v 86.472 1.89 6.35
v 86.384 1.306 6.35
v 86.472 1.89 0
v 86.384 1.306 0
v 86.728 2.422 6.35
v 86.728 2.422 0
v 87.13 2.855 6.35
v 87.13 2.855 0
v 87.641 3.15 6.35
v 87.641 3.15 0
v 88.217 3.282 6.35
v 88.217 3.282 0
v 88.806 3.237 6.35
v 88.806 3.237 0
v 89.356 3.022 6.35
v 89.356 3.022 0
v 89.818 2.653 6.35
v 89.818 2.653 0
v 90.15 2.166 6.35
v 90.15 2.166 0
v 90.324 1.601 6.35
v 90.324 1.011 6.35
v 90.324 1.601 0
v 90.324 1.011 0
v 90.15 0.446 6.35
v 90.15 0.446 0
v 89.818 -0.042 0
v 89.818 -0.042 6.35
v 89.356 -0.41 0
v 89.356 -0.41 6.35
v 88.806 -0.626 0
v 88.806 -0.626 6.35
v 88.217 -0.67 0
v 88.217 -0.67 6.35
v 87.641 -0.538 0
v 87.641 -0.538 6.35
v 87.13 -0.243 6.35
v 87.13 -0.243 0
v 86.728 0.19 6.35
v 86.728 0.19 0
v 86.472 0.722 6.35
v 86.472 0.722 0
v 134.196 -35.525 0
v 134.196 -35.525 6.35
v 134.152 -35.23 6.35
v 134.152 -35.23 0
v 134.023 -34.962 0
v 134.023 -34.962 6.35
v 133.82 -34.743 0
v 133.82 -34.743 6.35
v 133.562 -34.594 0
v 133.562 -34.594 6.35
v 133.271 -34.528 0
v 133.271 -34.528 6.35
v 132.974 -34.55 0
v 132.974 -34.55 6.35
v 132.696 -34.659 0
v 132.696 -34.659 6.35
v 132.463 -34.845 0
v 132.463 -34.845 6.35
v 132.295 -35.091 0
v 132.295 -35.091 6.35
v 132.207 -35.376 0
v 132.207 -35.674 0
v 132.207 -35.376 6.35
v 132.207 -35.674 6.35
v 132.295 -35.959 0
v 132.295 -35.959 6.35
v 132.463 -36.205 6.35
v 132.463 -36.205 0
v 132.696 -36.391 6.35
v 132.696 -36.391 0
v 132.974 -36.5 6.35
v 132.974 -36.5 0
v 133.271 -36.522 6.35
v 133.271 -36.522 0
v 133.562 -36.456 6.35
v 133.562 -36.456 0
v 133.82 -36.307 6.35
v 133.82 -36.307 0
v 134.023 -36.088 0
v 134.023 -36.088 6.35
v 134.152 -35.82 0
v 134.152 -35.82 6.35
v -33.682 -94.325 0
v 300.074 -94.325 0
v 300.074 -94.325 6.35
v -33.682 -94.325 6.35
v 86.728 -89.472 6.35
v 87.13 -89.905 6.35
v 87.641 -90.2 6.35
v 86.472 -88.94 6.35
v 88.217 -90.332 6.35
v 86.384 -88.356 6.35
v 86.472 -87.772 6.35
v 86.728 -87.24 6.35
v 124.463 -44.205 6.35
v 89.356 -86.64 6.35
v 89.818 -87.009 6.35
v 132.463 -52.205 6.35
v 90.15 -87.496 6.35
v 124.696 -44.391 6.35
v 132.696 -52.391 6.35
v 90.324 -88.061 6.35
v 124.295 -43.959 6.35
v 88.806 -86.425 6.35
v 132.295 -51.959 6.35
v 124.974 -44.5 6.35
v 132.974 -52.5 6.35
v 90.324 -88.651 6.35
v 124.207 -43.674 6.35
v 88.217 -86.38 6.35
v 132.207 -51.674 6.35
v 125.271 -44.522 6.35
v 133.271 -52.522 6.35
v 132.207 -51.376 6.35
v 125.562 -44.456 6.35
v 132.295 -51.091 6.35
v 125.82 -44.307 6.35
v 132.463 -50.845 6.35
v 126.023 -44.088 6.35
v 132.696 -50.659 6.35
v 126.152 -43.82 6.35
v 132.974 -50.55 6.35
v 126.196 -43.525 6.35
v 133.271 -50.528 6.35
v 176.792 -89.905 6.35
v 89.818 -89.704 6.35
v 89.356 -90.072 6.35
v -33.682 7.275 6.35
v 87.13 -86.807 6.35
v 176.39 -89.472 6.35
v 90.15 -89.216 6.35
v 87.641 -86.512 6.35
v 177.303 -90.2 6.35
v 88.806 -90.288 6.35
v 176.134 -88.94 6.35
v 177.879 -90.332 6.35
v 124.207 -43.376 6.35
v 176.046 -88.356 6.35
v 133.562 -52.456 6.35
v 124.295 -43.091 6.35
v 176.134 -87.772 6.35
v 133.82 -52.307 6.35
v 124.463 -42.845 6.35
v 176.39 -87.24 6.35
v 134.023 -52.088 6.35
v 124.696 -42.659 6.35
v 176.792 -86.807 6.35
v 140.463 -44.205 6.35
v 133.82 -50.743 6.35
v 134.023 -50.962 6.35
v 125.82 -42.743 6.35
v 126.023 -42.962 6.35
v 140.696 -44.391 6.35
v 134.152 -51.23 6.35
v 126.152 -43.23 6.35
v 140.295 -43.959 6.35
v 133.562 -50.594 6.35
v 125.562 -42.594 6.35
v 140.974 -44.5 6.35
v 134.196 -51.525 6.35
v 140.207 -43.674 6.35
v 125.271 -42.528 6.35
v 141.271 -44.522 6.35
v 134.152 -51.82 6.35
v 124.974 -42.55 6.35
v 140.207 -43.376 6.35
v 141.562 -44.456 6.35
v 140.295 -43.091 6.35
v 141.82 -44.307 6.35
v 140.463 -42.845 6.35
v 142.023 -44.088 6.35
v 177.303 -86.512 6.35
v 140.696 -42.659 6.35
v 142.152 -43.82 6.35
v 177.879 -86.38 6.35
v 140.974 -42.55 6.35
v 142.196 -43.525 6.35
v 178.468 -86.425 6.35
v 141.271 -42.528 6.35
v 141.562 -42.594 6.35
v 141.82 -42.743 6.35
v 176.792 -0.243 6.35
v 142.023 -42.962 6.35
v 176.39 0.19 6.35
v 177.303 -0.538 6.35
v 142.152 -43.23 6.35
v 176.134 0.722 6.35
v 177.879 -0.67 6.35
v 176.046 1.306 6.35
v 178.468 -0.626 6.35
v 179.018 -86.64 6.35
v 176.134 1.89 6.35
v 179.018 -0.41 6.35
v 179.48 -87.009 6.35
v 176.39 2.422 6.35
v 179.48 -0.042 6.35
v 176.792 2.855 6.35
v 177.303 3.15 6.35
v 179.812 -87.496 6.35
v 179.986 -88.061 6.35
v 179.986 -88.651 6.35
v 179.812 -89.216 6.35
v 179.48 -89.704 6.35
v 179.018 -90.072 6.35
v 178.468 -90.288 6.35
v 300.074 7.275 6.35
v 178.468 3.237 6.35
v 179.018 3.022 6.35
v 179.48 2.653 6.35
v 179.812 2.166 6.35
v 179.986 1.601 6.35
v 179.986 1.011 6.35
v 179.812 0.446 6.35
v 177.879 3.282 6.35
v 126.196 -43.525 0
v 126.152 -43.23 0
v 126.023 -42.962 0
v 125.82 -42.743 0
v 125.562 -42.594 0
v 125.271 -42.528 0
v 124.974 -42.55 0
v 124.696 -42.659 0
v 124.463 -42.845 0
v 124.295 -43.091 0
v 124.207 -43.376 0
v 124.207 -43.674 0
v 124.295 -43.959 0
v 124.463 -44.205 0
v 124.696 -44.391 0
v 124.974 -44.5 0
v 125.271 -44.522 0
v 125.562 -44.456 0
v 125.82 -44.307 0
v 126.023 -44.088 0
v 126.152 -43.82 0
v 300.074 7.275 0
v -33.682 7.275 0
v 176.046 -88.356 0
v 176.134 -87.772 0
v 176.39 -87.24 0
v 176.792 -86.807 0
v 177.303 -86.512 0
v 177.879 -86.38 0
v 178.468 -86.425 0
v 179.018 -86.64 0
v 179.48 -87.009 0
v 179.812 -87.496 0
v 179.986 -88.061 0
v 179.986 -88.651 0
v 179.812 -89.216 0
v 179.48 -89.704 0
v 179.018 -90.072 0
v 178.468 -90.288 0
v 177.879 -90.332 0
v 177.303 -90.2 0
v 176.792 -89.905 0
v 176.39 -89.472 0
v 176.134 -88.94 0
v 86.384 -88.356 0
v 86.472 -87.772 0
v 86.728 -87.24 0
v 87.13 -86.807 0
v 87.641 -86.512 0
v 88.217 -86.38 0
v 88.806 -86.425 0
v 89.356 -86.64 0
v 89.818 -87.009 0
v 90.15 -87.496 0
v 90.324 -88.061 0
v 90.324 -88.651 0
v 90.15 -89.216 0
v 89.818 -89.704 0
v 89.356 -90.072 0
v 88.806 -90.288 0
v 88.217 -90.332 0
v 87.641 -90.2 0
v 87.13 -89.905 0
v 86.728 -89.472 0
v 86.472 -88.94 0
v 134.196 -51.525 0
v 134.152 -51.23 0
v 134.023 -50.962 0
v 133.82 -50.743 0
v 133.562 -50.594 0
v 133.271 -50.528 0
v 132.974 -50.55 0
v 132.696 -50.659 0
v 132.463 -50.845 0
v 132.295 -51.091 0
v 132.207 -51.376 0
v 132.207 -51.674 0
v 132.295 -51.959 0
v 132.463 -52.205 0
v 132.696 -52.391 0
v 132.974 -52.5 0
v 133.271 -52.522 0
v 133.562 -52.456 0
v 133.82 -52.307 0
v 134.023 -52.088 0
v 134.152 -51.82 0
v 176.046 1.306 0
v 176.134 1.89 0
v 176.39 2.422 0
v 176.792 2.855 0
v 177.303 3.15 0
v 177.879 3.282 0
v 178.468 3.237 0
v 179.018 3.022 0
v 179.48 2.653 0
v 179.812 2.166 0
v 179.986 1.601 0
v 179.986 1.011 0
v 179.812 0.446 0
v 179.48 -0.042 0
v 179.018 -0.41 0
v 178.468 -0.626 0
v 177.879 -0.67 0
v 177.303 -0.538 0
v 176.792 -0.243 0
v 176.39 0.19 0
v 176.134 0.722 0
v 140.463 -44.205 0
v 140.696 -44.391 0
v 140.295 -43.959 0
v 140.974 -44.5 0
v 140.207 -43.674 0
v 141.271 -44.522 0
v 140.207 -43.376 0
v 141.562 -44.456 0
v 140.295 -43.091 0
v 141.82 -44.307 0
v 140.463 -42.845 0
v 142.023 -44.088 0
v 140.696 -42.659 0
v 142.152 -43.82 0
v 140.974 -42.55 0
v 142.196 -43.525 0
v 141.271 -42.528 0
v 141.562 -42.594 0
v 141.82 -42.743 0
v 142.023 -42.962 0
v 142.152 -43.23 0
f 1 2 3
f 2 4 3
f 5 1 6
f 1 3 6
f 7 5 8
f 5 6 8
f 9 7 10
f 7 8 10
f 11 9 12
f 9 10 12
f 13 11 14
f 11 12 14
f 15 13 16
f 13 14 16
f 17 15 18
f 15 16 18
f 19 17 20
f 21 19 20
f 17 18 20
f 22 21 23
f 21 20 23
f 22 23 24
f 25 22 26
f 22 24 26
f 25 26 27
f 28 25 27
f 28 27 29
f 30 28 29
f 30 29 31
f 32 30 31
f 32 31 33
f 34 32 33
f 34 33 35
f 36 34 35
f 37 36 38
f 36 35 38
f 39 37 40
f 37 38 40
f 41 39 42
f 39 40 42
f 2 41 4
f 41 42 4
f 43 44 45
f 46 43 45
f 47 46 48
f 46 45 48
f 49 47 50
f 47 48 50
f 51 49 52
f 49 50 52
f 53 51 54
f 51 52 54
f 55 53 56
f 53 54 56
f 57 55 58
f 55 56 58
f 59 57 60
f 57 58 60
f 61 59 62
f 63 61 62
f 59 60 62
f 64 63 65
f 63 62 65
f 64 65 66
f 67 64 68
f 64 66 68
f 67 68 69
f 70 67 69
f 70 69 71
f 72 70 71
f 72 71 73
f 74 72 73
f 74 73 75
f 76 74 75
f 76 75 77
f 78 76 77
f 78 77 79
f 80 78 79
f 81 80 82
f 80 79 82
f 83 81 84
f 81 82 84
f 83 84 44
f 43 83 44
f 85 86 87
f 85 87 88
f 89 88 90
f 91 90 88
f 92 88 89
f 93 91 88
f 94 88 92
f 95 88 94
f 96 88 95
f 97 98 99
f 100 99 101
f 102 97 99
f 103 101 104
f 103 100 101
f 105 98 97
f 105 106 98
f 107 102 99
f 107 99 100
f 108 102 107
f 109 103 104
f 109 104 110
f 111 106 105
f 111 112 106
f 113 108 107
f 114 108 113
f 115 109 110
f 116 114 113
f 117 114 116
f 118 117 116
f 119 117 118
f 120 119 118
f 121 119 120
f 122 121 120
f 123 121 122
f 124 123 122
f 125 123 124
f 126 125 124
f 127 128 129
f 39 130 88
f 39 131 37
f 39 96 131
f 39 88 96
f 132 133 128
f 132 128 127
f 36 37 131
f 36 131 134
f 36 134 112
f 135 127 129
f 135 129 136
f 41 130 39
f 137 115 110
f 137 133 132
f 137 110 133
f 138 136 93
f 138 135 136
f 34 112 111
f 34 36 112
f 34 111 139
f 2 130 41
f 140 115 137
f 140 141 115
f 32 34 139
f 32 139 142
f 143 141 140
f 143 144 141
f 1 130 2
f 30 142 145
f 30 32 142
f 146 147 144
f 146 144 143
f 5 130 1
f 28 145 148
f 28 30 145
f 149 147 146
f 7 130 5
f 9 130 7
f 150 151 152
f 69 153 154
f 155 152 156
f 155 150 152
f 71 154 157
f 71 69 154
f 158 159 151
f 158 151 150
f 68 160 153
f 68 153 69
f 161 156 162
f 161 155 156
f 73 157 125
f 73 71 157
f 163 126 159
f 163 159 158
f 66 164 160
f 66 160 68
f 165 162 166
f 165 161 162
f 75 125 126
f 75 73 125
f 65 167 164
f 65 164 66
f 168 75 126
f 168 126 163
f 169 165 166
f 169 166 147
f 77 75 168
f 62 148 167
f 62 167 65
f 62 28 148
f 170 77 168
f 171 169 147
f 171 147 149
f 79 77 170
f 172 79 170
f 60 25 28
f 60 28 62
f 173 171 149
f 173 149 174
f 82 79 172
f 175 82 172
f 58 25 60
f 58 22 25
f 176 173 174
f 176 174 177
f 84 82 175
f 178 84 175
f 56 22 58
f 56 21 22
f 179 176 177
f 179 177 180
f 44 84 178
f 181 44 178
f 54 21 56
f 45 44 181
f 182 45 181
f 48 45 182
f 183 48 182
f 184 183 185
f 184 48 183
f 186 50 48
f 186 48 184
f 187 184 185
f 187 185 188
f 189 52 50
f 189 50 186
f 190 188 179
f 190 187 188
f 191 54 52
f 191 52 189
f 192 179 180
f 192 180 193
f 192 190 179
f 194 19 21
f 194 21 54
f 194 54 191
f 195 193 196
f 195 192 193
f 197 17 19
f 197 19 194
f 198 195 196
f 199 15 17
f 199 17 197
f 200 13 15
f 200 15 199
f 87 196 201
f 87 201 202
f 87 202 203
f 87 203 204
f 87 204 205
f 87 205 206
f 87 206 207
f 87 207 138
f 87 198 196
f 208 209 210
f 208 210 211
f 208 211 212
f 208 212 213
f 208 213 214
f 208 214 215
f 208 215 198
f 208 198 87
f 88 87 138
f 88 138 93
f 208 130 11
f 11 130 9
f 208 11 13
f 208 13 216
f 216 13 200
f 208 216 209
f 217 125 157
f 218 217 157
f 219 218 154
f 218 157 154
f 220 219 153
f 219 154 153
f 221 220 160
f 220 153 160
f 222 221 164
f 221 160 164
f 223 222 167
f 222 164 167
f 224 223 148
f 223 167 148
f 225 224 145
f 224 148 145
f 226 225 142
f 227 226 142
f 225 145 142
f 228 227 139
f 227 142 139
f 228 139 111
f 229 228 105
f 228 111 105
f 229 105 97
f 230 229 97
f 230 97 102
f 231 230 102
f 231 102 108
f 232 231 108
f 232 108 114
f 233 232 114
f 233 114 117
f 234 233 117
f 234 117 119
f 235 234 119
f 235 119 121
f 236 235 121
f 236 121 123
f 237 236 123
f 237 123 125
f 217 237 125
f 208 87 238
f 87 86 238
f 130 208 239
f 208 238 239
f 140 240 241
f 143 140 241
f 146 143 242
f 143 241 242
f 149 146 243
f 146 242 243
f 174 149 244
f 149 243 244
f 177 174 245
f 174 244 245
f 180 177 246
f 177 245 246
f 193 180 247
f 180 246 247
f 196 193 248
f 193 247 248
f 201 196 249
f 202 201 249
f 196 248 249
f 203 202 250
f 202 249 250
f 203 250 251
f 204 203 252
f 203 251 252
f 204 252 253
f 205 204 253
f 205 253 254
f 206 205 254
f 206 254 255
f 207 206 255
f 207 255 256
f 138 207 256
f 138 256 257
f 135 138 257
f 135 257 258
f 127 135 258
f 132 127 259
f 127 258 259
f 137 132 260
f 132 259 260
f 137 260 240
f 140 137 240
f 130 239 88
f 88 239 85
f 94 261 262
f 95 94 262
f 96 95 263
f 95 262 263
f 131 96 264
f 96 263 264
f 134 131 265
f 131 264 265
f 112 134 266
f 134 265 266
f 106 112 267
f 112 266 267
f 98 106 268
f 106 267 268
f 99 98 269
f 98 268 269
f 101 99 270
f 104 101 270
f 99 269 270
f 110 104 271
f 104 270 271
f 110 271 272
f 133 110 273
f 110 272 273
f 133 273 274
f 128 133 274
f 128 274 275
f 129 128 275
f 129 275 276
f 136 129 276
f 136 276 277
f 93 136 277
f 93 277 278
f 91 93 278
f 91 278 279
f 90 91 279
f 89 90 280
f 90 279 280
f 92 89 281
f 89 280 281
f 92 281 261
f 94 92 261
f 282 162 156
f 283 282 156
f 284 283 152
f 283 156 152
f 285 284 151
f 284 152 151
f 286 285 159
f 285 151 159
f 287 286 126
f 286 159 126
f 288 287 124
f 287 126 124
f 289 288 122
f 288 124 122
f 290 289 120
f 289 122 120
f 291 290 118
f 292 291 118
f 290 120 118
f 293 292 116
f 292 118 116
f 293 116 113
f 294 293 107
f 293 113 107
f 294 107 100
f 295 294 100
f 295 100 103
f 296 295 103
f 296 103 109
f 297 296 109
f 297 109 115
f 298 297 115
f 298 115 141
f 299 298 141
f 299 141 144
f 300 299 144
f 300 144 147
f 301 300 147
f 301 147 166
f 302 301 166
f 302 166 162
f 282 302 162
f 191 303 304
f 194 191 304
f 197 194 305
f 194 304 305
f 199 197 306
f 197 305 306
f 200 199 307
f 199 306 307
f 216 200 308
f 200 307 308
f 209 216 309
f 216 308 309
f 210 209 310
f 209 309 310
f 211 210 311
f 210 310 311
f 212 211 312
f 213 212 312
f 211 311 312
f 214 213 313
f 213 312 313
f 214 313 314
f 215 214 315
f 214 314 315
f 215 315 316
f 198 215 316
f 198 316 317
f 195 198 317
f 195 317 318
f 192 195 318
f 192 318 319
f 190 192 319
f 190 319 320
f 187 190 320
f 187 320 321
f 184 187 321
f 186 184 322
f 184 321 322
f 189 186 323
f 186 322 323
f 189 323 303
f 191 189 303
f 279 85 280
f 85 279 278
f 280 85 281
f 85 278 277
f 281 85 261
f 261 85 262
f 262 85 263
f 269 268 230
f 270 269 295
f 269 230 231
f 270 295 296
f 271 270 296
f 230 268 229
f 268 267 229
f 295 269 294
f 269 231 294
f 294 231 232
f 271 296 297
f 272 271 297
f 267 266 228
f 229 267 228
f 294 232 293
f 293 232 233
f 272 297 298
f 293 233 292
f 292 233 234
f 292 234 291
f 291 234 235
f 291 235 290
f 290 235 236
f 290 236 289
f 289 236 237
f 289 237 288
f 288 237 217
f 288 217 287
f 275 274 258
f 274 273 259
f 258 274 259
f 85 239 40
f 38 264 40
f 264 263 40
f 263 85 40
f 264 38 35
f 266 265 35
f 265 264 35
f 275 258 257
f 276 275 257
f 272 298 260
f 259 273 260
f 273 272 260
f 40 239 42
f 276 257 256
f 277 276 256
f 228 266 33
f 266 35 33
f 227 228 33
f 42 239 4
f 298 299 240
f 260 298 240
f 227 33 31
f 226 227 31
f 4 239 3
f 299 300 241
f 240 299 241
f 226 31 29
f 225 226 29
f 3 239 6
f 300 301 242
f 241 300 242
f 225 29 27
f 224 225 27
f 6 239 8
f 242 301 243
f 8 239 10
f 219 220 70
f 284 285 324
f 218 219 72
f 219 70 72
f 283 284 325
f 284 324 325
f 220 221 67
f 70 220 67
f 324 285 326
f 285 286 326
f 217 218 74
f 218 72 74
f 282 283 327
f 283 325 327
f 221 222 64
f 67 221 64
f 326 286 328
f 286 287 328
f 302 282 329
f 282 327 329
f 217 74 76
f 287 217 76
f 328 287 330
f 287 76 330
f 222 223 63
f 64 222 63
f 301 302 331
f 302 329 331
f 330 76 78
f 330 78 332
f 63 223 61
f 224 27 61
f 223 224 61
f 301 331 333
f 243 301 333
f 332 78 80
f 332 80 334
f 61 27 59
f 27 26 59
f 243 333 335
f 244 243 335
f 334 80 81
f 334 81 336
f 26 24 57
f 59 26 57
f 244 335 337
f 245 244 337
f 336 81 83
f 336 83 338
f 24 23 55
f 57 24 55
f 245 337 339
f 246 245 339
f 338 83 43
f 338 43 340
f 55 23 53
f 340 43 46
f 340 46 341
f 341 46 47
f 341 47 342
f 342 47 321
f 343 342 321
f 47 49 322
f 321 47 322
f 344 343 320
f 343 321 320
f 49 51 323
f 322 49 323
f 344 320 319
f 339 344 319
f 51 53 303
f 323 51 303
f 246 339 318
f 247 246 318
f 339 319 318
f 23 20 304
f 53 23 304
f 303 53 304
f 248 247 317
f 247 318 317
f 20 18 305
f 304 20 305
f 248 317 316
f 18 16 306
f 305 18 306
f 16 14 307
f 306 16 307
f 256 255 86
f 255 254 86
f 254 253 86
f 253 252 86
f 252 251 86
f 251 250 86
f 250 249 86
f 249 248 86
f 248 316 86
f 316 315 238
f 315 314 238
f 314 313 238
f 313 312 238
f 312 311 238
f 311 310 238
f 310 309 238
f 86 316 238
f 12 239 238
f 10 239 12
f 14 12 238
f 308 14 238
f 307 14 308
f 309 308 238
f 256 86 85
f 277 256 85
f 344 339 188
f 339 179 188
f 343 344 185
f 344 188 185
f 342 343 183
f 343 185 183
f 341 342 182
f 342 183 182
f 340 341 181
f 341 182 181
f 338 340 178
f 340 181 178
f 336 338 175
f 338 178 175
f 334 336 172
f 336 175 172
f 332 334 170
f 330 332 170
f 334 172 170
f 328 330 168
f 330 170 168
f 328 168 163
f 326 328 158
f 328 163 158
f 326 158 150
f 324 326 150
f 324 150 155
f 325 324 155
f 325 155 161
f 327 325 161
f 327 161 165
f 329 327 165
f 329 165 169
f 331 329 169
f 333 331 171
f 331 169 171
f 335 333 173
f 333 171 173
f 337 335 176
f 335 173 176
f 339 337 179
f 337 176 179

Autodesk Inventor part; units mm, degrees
ref_plane "YZ Plane" through (0, 0, 0) normal (1, 0, 0) x (0, 1, 0)
ref_plane "XZ Plane" through (0, 0, 0) normal (0, 1, 0) x (-1, 0, 0)
ref_plane "XY Plane" through (0, 0, 0) normal (0, 0, 1) x (1, 0, 0)
sketch "Sketch1" plane through (0, 0, 0) normal (0, 0, 1) x (1, 0, 0)
  line L0 (-33.6817, -5.828) -> (300.0743, -5.828)
  line L1 (300.0743, -5.828) -> (300.0743, 7.2749)
  line L2 (300.0743, 7.2749) -> (-33.6817, 7.2749)
  line L3 (-33.6817, 7.2749) -> (-33.6817, -5.828)
  line L4 (-33.6817, 7.2749) -> (300.0743, 7.2749)
  line L5 (300.0743, 7.2749) -> (300.0743, -94.3251)
  line L6 (300.0743, -94.3251) -> (-33.6817, -94.3251)
  line L7 (-33.6817, -94.3251) -> (-33.6817, 7.2749)
  point P0 (0, 0)
  dimension "d0" = 333.756
  dimension "d1" = 101.6
extrude "Extrusion1" add sketch "Sketch1" along normal blind 6.35
sketch "Sketch2" plane through (0, 0, 6.35) normal (0, 0, 1) x (1, 0, 0)
  circle A0 centre (133.1963, -43.5251) radius 8
  circle A1 centre (133.1963, -35.5251) radius 1
  circle A2 centre (141.1963, -43.5251) radius 1
  circle A3 centre (133.1963, -51.5251) radius 1
  circle A4 centre (125.1963, -43.5251) radius 1
  point P0 (0, 0)
  dimension "d4" = 16
  dimension "d5" = 2
  dimension "d6" = 2
  dimension "d7" = 2
  dimension "d8" = 2
extrude "Extrusion2" cut sketch "Sketch2" against normal blind 6.35 contours A0 A2 | A0 A2 | A1 A0 | A0 A1 | A3 A0 | A0 A3 | A4 A0 | A0 A4
sketch "Sketch3" plane through (0, 0, 0) normal (0, 0, -1) x (-1, 0, 0)
  line L0 (33.6817, -94.3251) -> (-300.0743, -94.3251) projected
  line L1 (-133.1963, -43.5251) -> (-133.1963, -88.3561)
  line L2 (-133.1963, -88.3561) -> (-178.0273, -88.3561)
  line L3 (-178.0273, -88.3561) -> (-88.3653, -88.3561)
  line L4 (-88.3653, -88.3561) -> (-88.3653, 1.3059)
  line L5 (-88.3653, 1.3059) -> (-178.0273, 1.3059)
  line L6 (-178.0273, 1.3059) -> (-178.0273, -88.3561)
  circle A0 centre (-88.3653, 1.3059) radius 1.9812
  circle A1 centre (-88.3653, -88.3561) radius 1.9812
  circle A2 centre (-178.0273, -88.3561) radius 1.9812
  circle A3 centre (-178.0273, 1.3059) radius 1.9812
  point P0 (0, 0)
  dimension "d11" = 44.831
  dimension "d12" = 44.831
  dimension "d13" = 89.662
  dimension "d14" = 89.662
  dimension "d15" = 3.9624
  dimension "d16" = 3.9624
  dimension "d17" = 3.9624
extrude "Extrusion3" cut sketch "Sketch3" against normal blind 6.35 contours A2 L6 L2 | L2 L6 A2 | A1 L4 L3 | L3 L4 A1 | A3 L5 L6 | L6 L5 A3 | A0 L5 L4 | L4 L5 A0
properties part number "kinect rotate bottom"
